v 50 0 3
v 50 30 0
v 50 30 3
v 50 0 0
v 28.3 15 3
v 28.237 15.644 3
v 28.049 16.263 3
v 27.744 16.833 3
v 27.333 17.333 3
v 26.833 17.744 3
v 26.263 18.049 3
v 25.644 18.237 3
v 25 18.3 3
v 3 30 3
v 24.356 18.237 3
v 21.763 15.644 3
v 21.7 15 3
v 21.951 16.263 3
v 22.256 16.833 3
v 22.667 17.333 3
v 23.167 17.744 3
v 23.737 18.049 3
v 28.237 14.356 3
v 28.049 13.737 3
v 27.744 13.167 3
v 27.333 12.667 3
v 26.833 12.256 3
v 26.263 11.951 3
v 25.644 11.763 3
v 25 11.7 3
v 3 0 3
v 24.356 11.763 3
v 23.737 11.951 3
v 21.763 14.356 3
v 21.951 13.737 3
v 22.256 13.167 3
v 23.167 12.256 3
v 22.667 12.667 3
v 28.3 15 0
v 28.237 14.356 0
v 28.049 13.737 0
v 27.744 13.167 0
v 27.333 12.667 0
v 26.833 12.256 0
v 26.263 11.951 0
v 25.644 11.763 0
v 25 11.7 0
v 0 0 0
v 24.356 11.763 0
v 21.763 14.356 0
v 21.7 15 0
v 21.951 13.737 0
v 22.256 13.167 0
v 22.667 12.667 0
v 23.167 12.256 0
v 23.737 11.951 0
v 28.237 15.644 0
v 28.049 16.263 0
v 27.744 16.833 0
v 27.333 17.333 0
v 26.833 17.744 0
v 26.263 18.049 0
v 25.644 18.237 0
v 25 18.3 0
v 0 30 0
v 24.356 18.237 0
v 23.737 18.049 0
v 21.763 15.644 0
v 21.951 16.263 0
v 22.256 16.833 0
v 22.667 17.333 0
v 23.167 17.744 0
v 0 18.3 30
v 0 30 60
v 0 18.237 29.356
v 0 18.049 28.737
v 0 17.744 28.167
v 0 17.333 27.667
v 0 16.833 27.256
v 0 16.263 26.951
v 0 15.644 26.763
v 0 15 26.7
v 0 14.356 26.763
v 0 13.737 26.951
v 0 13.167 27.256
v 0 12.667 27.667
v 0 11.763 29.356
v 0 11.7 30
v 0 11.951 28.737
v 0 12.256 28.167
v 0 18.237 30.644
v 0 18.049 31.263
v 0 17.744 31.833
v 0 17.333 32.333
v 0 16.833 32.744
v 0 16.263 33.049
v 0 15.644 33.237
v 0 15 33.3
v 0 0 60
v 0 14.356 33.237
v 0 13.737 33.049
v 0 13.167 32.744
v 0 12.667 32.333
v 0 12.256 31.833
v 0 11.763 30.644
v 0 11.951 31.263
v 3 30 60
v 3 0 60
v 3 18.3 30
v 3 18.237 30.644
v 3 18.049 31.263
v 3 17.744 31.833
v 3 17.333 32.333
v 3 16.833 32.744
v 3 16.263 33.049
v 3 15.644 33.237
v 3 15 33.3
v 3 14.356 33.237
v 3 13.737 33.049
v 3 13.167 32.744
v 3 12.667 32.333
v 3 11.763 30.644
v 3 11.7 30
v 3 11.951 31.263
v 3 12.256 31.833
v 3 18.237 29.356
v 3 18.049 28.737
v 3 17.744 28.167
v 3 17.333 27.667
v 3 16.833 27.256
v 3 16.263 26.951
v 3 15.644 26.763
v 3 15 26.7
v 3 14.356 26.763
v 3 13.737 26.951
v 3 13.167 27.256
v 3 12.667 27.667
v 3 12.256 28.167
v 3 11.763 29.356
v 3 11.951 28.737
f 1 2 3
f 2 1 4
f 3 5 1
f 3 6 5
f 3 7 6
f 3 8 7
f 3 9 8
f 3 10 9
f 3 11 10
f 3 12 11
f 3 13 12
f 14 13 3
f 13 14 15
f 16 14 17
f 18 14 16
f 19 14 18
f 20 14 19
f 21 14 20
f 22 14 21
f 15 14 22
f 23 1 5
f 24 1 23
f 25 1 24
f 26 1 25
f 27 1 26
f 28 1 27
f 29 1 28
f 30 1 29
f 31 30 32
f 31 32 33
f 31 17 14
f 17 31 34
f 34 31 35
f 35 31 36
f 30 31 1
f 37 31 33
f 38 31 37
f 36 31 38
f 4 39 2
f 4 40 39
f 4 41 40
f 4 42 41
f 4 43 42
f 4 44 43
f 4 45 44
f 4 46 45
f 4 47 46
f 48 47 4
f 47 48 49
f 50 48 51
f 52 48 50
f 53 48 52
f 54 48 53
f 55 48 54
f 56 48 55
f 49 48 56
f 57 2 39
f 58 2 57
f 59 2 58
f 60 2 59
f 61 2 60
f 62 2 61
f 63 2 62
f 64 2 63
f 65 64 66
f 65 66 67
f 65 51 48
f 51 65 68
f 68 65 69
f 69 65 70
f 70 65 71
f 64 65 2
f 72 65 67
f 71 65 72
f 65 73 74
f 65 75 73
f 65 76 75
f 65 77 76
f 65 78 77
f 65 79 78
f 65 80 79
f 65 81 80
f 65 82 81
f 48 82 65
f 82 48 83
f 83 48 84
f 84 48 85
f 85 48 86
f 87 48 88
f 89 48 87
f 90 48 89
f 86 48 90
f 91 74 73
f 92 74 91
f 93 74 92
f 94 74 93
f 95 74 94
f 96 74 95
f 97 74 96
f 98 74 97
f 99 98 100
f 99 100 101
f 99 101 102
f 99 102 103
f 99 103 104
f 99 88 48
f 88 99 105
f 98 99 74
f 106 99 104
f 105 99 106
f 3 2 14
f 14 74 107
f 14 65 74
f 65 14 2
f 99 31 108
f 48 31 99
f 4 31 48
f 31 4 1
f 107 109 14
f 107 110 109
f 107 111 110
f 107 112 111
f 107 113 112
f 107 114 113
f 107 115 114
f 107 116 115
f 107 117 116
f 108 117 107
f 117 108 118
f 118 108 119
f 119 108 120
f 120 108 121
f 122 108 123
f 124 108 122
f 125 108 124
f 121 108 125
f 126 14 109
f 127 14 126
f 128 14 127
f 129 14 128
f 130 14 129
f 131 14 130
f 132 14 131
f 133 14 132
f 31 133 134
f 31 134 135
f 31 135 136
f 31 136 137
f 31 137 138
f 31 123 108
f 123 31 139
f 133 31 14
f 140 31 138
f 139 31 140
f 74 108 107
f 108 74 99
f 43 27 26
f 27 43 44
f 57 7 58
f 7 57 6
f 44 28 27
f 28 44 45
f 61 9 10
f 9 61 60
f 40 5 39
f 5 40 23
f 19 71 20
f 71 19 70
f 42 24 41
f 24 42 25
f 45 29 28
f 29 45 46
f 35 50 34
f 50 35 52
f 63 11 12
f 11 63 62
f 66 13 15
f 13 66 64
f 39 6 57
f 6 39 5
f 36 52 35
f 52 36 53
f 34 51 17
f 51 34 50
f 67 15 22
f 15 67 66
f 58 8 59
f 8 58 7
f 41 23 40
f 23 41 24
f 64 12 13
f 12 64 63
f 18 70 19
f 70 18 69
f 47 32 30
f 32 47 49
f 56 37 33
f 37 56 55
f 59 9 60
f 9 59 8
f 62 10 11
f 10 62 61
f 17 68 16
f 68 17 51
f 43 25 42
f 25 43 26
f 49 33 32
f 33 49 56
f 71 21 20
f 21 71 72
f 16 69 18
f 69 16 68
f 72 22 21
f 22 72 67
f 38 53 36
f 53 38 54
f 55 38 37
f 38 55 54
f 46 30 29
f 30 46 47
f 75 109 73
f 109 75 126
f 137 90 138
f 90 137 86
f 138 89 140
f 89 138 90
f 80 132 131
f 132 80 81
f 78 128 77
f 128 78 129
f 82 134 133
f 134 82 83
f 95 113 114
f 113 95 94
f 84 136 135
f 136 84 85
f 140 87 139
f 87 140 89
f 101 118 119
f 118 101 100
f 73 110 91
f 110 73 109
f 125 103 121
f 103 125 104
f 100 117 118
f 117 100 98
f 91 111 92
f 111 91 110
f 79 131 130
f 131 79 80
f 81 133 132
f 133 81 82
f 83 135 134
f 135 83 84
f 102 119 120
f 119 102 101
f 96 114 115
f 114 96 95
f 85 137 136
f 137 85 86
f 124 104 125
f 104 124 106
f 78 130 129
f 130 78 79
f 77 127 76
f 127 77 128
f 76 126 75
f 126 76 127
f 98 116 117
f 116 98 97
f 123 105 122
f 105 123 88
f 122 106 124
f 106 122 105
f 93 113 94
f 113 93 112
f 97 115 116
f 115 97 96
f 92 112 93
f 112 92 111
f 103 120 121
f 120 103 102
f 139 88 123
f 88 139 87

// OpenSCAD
$fn = 32;

// ----------------------------------------------------------------------
// L-bracket: 50 x 30 x 60 mm
// ----------------------------------------------------------------------

// --- parameters (mm) ---
base_len = 50;            // horizontal leg, X
upright_h = 60;           // vertical leg, Z
flange_w = 30;            // bracket depth, Y
mat_t = 3;                // plate thickness
hole_d = 6.6;             // clearance for M6

module hole_z(px, py) {
  translate([px, py, -2.5]) cylinder(h = mat_t + 5, d = hole_d);
}
module hole_x(pz, py) {
  translate([-2.5, py, pz]) rotate([0, 90, 0]) cylinder(h = mat_t + 5, d = hole_d);
}

difference() {
  union() {
    /* horizontal leg */
    cube([base_len, flange_w, mat_t]);
    /* vertical leg, overlapping the corner block */
    cube([mat_t, flange_w, upright_h]);
  }
  hole_z(25, 15);
  hole_x(30, 15);
}
